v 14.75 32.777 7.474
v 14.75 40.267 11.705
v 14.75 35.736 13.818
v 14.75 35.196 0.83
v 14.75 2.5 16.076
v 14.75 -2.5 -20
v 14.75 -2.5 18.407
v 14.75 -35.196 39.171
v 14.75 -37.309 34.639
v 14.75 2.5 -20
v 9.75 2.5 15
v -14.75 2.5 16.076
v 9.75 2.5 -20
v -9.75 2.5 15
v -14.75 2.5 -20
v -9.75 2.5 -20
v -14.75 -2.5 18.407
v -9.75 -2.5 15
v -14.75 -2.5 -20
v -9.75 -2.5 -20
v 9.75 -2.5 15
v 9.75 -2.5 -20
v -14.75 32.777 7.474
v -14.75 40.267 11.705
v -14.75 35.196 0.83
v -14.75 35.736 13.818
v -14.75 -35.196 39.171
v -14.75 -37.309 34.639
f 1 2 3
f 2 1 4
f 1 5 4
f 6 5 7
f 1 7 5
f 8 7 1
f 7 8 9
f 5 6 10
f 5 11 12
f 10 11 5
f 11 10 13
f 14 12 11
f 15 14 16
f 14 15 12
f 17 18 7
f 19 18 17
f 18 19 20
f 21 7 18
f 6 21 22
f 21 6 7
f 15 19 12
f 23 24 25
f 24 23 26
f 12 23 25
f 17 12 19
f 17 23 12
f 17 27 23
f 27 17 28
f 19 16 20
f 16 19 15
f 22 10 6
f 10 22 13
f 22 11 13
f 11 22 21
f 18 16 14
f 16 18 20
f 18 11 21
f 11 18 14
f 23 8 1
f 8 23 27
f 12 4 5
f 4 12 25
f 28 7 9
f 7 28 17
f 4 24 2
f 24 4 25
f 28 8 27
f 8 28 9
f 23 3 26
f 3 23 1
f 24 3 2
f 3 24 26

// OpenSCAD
pad = .4;
w = 19.5;
h = 30;
th = 5;
angle=25;

module bed() {
    foot_h = 7;
    bed_l = 80;
    cube([w+th*2,bed_l,th], center=true);
    
    translate([0,bed_l/2-th/2,(th+foot_h)/2])
    rotate([90,0,0])
    cube([w+th*2,foot_h,th], center=true);
}

module phone_holder() {
    rotate([-90,0,0])
    difference() {
        cube([w+th*2,h+th*2,th], center=true);
        translate([0,th,0])
        cube([w,h+th*2,th*2], center=true);
    }
    
    translate([0,0,h/2+th/2+th/2])
    rotate([-angle,0,0])
    bed();
}


phone_holder();
